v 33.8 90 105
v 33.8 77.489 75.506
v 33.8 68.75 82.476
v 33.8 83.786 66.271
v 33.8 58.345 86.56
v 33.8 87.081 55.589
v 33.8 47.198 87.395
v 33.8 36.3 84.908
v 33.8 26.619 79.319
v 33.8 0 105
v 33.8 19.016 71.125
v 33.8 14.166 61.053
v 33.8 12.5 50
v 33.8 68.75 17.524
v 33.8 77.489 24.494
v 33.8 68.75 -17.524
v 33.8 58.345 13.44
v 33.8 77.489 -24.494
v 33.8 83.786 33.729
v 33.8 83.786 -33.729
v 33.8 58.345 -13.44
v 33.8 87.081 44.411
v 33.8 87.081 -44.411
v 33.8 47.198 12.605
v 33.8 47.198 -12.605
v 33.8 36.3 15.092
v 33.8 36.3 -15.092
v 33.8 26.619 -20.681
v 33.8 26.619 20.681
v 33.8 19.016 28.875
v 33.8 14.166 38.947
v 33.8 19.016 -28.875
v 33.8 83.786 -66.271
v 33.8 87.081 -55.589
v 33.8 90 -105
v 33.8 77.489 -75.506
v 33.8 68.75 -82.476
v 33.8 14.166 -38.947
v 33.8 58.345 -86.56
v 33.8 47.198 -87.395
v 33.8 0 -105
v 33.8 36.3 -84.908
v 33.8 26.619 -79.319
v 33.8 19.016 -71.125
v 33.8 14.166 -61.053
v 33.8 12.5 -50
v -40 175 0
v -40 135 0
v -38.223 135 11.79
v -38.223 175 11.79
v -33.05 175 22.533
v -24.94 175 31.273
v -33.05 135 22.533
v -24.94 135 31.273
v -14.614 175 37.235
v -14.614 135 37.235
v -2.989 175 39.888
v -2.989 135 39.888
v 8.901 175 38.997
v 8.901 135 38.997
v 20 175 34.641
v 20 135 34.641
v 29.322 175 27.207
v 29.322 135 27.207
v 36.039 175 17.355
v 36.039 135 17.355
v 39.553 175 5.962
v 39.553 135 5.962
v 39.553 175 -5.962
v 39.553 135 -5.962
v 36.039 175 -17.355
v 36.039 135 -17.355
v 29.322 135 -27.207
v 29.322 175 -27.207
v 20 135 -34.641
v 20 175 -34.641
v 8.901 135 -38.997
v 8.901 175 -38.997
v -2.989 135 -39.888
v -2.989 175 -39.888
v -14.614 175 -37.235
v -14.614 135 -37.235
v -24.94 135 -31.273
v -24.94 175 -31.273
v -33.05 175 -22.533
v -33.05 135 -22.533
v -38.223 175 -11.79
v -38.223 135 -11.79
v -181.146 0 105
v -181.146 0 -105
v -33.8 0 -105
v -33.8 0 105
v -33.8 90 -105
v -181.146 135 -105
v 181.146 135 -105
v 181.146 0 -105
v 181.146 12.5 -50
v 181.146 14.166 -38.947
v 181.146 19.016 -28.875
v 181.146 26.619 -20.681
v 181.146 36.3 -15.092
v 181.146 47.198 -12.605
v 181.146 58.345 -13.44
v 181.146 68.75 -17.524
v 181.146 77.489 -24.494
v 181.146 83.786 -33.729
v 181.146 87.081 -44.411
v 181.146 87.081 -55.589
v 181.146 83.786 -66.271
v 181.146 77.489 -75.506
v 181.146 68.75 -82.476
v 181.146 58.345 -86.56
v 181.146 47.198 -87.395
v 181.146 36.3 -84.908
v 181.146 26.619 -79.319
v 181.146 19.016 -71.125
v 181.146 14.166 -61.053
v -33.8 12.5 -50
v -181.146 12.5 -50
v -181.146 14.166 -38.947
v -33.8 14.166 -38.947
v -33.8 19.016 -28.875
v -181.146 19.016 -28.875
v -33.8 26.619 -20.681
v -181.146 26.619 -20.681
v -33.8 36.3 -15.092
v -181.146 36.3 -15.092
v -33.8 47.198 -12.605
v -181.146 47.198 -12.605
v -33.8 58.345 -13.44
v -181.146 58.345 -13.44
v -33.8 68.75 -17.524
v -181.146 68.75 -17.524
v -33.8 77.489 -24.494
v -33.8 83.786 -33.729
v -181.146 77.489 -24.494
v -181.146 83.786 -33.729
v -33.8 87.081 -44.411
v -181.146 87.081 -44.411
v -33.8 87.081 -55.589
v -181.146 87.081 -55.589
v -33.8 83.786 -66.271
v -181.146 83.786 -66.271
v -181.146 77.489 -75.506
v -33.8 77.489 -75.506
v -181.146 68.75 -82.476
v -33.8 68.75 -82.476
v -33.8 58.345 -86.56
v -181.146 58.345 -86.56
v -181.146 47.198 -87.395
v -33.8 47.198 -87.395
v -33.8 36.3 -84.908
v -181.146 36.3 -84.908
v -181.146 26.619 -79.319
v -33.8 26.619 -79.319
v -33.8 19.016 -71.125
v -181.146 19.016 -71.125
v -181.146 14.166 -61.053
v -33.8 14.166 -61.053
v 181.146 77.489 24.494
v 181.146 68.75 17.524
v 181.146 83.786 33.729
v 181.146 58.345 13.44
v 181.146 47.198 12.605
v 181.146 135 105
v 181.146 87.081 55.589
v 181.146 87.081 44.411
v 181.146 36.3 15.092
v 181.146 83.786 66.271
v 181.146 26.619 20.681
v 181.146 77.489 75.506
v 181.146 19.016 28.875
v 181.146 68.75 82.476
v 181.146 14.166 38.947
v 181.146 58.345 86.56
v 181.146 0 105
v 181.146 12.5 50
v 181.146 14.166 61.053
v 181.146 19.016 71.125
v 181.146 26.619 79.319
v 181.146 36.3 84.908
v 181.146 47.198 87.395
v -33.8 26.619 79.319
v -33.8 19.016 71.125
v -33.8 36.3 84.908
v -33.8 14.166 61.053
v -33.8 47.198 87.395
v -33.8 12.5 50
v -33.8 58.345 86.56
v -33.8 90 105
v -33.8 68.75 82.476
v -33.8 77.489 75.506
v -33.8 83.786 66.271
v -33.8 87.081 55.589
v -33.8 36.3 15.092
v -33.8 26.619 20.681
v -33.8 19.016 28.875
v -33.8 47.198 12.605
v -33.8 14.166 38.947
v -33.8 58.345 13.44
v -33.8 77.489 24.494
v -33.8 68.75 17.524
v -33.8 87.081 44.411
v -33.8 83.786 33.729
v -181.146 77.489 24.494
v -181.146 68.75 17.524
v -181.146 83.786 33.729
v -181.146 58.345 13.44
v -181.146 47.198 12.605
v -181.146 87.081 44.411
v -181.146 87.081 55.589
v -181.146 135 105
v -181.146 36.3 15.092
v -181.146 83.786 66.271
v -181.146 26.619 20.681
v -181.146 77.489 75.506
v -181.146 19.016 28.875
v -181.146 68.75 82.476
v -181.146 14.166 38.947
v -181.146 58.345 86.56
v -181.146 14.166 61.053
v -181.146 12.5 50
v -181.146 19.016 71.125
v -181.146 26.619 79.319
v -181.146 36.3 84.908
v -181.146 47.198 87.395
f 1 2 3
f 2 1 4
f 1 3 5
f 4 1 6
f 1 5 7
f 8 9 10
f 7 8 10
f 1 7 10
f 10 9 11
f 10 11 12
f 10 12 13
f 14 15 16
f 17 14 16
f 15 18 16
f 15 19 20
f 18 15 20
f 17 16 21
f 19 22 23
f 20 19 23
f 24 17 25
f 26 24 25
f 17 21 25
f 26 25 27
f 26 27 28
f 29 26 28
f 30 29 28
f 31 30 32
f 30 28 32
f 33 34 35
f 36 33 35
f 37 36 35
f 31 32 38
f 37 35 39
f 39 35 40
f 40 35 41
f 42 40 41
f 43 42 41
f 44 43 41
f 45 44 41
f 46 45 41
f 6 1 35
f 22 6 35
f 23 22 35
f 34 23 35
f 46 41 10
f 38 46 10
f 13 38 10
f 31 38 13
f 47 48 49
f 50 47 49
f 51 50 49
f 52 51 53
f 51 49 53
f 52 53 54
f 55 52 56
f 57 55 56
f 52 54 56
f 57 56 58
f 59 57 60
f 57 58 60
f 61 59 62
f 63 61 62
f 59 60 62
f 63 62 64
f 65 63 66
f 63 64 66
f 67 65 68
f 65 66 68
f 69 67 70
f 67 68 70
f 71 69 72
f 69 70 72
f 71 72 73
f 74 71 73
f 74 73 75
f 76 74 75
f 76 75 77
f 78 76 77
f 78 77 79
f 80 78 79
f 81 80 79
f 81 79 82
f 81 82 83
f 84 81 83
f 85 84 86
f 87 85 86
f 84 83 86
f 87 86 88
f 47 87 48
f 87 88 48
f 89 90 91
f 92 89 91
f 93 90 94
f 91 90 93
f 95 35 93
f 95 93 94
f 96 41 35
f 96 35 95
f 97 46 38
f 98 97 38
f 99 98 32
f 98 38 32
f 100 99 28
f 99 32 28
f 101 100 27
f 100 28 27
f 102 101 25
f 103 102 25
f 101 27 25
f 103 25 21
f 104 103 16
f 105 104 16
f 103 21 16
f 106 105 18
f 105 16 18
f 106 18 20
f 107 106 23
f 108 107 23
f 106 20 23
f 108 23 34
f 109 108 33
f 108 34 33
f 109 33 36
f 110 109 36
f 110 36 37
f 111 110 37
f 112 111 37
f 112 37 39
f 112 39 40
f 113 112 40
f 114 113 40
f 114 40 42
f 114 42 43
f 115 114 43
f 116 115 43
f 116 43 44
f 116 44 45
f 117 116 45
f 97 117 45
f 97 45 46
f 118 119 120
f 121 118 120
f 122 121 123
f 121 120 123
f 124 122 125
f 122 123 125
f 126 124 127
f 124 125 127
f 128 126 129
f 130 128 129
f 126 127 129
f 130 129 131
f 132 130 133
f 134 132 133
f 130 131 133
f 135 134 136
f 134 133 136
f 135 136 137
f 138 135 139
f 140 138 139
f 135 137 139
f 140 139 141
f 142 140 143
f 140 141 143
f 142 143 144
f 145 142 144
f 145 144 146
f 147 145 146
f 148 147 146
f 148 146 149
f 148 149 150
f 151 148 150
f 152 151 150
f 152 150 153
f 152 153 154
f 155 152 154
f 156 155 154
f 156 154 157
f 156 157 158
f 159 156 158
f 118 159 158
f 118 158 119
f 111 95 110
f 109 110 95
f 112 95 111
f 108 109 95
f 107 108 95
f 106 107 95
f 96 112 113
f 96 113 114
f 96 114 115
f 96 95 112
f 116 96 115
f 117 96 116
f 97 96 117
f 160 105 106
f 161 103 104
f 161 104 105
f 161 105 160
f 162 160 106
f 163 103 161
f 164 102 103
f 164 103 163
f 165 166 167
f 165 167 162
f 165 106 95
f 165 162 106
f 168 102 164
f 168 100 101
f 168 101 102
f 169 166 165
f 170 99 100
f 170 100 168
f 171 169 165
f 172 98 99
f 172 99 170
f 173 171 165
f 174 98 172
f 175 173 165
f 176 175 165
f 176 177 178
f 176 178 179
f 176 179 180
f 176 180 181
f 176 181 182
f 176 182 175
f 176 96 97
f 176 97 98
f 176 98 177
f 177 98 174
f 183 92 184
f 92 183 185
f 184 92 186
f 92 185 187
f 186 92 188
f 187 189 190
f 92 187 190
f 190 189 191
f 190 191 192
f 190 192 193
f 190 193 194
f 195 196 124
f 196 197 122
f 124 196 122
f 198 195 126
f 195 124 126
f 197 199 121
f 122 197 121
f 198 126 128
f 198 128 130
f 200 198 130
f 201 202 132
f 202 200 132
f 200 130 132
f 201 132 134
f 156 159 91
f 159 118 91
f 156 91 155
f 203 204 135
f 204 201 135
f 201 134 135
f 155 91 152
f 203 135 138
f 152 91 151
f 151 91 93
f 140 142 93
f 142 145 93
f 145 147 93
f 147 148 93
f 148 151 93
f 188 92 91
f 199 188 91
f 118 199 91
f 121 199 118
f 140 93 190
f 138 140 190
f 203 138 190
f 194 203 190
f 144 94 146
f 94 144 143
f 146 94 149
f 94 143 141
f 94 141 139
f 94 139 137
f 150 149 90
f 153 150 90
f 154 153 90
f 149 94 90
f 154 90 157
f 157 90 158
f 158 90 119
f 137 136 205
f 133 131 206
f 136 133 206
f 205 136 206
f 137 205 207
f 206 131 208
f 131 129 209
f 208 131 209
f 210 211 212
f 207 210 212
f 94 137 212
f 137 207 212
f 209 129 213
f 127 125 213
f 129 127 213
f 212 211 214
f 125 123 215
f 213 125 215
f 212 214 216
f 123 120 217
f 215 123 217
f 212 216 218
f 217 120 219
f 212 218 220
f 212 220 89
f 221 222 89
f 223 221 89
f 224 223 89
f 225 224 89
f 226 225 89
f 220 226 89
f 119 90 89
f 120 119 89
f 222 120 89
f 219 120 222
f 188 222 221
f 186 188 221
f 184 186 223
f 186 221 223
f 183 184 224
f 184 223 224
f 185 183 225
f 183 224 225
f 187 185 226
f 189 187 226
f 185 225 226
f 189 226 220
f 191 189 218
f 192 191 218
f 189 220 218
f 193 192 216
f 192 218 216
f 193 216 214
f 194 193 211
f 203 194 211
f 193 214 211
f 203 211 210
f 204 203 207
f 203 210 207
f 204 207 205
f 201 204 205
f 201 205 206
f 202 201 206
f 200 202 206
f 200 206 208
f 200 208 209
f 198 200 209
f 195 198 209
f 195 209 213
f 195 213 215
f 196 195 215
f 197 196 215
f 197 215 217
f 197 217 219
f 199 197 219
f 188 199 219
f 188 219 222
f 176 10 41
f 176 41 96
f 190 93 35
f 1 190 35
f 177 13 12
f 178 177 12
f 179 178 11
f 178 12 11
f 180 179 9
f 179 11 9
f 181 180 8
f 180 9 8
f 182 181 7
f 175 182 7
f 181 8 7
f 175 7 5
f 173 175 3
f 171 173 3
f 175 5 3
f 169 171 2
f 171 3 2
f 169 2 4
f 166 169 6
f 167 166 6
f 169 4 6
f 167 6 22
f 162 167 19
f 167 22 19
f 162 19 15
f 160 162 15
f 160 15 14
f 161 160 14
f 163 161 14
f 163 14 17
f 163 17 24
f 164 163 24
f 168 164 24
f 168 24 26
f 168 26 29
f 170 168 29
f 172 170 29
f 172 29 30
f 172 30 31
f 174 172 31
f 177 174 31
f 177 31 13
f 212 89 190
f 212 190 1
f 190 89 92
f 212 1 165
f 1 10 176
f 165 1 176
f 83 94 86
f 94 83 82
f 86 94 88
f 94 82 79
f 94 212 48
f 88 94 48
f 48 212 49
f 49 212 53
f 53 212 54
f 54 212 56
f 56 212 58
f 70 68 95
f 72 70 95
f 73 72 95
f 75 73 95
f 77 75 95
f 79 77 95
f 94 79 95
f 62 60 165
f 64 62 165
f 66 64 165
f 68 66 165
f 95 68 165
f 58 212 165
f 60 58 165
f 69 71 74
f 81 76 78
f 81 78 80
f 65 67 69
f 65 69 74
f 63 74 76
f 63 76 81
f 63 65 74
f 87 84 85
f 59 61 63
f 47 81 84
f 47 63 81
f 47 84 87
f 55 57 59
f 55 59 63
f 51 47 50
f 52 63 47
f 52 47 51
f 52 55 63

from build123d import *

# Parameters (mm, degrees)
F0_W     = 362.293
F0_H     = 210
F1_DEPTH = 135
F2_R     = 40
F3_DEPTH = 40
F5_DEPTH = 210.001
F6_R     = 37.5
F7_DEPTH = 362.294


with BuildPart() as f1:
    # F0 (on Front) → F1 (new body)
    with BuildSketch(Plane.XZ):
        Rectangle(F0_W, F0_H)
    extrude(amount=-F1_DEPTH)

    # F2 (on face) → F3 (join)
    with BuildSketch(Plane(origin=(0, 135, 0), x_dir=(-1, 0, 0), z_dir=(0, 1, 0))):
        Circle(F2_R)
    extrude(amount=F3_DEPTH)

    # F4 (on face) → F5 (cut, through all)
    with BuildSketch(Plane(origin=(0, 0, -105), x_dir=(1, 0, 0), z_dir=(0, 0, -1))):
        Polygon((0, 0), (-33.8, 0), (-33.8, -90), (33.8, -90), (33.8, 0), align=None)
    extrude(amount=-F5_DEPTH, mode=Mode.SUBTRACT)

    # F6 (on face) → F7 (cut, through all)
    with BuildSketch(Plane(origin=(-181.1465, 0, 0), x_dir=(0, -1, 0), z_dir=(-1, 0, 0))):
        with Locations((-50, 50)):
            Circle(F6_R)
        with Locations((-50, -50)):
            Circle(F6_R)
    extrude(amount=-F7_DEPTH, mode=Mode.SUBTRACT)


solid = f1.part
